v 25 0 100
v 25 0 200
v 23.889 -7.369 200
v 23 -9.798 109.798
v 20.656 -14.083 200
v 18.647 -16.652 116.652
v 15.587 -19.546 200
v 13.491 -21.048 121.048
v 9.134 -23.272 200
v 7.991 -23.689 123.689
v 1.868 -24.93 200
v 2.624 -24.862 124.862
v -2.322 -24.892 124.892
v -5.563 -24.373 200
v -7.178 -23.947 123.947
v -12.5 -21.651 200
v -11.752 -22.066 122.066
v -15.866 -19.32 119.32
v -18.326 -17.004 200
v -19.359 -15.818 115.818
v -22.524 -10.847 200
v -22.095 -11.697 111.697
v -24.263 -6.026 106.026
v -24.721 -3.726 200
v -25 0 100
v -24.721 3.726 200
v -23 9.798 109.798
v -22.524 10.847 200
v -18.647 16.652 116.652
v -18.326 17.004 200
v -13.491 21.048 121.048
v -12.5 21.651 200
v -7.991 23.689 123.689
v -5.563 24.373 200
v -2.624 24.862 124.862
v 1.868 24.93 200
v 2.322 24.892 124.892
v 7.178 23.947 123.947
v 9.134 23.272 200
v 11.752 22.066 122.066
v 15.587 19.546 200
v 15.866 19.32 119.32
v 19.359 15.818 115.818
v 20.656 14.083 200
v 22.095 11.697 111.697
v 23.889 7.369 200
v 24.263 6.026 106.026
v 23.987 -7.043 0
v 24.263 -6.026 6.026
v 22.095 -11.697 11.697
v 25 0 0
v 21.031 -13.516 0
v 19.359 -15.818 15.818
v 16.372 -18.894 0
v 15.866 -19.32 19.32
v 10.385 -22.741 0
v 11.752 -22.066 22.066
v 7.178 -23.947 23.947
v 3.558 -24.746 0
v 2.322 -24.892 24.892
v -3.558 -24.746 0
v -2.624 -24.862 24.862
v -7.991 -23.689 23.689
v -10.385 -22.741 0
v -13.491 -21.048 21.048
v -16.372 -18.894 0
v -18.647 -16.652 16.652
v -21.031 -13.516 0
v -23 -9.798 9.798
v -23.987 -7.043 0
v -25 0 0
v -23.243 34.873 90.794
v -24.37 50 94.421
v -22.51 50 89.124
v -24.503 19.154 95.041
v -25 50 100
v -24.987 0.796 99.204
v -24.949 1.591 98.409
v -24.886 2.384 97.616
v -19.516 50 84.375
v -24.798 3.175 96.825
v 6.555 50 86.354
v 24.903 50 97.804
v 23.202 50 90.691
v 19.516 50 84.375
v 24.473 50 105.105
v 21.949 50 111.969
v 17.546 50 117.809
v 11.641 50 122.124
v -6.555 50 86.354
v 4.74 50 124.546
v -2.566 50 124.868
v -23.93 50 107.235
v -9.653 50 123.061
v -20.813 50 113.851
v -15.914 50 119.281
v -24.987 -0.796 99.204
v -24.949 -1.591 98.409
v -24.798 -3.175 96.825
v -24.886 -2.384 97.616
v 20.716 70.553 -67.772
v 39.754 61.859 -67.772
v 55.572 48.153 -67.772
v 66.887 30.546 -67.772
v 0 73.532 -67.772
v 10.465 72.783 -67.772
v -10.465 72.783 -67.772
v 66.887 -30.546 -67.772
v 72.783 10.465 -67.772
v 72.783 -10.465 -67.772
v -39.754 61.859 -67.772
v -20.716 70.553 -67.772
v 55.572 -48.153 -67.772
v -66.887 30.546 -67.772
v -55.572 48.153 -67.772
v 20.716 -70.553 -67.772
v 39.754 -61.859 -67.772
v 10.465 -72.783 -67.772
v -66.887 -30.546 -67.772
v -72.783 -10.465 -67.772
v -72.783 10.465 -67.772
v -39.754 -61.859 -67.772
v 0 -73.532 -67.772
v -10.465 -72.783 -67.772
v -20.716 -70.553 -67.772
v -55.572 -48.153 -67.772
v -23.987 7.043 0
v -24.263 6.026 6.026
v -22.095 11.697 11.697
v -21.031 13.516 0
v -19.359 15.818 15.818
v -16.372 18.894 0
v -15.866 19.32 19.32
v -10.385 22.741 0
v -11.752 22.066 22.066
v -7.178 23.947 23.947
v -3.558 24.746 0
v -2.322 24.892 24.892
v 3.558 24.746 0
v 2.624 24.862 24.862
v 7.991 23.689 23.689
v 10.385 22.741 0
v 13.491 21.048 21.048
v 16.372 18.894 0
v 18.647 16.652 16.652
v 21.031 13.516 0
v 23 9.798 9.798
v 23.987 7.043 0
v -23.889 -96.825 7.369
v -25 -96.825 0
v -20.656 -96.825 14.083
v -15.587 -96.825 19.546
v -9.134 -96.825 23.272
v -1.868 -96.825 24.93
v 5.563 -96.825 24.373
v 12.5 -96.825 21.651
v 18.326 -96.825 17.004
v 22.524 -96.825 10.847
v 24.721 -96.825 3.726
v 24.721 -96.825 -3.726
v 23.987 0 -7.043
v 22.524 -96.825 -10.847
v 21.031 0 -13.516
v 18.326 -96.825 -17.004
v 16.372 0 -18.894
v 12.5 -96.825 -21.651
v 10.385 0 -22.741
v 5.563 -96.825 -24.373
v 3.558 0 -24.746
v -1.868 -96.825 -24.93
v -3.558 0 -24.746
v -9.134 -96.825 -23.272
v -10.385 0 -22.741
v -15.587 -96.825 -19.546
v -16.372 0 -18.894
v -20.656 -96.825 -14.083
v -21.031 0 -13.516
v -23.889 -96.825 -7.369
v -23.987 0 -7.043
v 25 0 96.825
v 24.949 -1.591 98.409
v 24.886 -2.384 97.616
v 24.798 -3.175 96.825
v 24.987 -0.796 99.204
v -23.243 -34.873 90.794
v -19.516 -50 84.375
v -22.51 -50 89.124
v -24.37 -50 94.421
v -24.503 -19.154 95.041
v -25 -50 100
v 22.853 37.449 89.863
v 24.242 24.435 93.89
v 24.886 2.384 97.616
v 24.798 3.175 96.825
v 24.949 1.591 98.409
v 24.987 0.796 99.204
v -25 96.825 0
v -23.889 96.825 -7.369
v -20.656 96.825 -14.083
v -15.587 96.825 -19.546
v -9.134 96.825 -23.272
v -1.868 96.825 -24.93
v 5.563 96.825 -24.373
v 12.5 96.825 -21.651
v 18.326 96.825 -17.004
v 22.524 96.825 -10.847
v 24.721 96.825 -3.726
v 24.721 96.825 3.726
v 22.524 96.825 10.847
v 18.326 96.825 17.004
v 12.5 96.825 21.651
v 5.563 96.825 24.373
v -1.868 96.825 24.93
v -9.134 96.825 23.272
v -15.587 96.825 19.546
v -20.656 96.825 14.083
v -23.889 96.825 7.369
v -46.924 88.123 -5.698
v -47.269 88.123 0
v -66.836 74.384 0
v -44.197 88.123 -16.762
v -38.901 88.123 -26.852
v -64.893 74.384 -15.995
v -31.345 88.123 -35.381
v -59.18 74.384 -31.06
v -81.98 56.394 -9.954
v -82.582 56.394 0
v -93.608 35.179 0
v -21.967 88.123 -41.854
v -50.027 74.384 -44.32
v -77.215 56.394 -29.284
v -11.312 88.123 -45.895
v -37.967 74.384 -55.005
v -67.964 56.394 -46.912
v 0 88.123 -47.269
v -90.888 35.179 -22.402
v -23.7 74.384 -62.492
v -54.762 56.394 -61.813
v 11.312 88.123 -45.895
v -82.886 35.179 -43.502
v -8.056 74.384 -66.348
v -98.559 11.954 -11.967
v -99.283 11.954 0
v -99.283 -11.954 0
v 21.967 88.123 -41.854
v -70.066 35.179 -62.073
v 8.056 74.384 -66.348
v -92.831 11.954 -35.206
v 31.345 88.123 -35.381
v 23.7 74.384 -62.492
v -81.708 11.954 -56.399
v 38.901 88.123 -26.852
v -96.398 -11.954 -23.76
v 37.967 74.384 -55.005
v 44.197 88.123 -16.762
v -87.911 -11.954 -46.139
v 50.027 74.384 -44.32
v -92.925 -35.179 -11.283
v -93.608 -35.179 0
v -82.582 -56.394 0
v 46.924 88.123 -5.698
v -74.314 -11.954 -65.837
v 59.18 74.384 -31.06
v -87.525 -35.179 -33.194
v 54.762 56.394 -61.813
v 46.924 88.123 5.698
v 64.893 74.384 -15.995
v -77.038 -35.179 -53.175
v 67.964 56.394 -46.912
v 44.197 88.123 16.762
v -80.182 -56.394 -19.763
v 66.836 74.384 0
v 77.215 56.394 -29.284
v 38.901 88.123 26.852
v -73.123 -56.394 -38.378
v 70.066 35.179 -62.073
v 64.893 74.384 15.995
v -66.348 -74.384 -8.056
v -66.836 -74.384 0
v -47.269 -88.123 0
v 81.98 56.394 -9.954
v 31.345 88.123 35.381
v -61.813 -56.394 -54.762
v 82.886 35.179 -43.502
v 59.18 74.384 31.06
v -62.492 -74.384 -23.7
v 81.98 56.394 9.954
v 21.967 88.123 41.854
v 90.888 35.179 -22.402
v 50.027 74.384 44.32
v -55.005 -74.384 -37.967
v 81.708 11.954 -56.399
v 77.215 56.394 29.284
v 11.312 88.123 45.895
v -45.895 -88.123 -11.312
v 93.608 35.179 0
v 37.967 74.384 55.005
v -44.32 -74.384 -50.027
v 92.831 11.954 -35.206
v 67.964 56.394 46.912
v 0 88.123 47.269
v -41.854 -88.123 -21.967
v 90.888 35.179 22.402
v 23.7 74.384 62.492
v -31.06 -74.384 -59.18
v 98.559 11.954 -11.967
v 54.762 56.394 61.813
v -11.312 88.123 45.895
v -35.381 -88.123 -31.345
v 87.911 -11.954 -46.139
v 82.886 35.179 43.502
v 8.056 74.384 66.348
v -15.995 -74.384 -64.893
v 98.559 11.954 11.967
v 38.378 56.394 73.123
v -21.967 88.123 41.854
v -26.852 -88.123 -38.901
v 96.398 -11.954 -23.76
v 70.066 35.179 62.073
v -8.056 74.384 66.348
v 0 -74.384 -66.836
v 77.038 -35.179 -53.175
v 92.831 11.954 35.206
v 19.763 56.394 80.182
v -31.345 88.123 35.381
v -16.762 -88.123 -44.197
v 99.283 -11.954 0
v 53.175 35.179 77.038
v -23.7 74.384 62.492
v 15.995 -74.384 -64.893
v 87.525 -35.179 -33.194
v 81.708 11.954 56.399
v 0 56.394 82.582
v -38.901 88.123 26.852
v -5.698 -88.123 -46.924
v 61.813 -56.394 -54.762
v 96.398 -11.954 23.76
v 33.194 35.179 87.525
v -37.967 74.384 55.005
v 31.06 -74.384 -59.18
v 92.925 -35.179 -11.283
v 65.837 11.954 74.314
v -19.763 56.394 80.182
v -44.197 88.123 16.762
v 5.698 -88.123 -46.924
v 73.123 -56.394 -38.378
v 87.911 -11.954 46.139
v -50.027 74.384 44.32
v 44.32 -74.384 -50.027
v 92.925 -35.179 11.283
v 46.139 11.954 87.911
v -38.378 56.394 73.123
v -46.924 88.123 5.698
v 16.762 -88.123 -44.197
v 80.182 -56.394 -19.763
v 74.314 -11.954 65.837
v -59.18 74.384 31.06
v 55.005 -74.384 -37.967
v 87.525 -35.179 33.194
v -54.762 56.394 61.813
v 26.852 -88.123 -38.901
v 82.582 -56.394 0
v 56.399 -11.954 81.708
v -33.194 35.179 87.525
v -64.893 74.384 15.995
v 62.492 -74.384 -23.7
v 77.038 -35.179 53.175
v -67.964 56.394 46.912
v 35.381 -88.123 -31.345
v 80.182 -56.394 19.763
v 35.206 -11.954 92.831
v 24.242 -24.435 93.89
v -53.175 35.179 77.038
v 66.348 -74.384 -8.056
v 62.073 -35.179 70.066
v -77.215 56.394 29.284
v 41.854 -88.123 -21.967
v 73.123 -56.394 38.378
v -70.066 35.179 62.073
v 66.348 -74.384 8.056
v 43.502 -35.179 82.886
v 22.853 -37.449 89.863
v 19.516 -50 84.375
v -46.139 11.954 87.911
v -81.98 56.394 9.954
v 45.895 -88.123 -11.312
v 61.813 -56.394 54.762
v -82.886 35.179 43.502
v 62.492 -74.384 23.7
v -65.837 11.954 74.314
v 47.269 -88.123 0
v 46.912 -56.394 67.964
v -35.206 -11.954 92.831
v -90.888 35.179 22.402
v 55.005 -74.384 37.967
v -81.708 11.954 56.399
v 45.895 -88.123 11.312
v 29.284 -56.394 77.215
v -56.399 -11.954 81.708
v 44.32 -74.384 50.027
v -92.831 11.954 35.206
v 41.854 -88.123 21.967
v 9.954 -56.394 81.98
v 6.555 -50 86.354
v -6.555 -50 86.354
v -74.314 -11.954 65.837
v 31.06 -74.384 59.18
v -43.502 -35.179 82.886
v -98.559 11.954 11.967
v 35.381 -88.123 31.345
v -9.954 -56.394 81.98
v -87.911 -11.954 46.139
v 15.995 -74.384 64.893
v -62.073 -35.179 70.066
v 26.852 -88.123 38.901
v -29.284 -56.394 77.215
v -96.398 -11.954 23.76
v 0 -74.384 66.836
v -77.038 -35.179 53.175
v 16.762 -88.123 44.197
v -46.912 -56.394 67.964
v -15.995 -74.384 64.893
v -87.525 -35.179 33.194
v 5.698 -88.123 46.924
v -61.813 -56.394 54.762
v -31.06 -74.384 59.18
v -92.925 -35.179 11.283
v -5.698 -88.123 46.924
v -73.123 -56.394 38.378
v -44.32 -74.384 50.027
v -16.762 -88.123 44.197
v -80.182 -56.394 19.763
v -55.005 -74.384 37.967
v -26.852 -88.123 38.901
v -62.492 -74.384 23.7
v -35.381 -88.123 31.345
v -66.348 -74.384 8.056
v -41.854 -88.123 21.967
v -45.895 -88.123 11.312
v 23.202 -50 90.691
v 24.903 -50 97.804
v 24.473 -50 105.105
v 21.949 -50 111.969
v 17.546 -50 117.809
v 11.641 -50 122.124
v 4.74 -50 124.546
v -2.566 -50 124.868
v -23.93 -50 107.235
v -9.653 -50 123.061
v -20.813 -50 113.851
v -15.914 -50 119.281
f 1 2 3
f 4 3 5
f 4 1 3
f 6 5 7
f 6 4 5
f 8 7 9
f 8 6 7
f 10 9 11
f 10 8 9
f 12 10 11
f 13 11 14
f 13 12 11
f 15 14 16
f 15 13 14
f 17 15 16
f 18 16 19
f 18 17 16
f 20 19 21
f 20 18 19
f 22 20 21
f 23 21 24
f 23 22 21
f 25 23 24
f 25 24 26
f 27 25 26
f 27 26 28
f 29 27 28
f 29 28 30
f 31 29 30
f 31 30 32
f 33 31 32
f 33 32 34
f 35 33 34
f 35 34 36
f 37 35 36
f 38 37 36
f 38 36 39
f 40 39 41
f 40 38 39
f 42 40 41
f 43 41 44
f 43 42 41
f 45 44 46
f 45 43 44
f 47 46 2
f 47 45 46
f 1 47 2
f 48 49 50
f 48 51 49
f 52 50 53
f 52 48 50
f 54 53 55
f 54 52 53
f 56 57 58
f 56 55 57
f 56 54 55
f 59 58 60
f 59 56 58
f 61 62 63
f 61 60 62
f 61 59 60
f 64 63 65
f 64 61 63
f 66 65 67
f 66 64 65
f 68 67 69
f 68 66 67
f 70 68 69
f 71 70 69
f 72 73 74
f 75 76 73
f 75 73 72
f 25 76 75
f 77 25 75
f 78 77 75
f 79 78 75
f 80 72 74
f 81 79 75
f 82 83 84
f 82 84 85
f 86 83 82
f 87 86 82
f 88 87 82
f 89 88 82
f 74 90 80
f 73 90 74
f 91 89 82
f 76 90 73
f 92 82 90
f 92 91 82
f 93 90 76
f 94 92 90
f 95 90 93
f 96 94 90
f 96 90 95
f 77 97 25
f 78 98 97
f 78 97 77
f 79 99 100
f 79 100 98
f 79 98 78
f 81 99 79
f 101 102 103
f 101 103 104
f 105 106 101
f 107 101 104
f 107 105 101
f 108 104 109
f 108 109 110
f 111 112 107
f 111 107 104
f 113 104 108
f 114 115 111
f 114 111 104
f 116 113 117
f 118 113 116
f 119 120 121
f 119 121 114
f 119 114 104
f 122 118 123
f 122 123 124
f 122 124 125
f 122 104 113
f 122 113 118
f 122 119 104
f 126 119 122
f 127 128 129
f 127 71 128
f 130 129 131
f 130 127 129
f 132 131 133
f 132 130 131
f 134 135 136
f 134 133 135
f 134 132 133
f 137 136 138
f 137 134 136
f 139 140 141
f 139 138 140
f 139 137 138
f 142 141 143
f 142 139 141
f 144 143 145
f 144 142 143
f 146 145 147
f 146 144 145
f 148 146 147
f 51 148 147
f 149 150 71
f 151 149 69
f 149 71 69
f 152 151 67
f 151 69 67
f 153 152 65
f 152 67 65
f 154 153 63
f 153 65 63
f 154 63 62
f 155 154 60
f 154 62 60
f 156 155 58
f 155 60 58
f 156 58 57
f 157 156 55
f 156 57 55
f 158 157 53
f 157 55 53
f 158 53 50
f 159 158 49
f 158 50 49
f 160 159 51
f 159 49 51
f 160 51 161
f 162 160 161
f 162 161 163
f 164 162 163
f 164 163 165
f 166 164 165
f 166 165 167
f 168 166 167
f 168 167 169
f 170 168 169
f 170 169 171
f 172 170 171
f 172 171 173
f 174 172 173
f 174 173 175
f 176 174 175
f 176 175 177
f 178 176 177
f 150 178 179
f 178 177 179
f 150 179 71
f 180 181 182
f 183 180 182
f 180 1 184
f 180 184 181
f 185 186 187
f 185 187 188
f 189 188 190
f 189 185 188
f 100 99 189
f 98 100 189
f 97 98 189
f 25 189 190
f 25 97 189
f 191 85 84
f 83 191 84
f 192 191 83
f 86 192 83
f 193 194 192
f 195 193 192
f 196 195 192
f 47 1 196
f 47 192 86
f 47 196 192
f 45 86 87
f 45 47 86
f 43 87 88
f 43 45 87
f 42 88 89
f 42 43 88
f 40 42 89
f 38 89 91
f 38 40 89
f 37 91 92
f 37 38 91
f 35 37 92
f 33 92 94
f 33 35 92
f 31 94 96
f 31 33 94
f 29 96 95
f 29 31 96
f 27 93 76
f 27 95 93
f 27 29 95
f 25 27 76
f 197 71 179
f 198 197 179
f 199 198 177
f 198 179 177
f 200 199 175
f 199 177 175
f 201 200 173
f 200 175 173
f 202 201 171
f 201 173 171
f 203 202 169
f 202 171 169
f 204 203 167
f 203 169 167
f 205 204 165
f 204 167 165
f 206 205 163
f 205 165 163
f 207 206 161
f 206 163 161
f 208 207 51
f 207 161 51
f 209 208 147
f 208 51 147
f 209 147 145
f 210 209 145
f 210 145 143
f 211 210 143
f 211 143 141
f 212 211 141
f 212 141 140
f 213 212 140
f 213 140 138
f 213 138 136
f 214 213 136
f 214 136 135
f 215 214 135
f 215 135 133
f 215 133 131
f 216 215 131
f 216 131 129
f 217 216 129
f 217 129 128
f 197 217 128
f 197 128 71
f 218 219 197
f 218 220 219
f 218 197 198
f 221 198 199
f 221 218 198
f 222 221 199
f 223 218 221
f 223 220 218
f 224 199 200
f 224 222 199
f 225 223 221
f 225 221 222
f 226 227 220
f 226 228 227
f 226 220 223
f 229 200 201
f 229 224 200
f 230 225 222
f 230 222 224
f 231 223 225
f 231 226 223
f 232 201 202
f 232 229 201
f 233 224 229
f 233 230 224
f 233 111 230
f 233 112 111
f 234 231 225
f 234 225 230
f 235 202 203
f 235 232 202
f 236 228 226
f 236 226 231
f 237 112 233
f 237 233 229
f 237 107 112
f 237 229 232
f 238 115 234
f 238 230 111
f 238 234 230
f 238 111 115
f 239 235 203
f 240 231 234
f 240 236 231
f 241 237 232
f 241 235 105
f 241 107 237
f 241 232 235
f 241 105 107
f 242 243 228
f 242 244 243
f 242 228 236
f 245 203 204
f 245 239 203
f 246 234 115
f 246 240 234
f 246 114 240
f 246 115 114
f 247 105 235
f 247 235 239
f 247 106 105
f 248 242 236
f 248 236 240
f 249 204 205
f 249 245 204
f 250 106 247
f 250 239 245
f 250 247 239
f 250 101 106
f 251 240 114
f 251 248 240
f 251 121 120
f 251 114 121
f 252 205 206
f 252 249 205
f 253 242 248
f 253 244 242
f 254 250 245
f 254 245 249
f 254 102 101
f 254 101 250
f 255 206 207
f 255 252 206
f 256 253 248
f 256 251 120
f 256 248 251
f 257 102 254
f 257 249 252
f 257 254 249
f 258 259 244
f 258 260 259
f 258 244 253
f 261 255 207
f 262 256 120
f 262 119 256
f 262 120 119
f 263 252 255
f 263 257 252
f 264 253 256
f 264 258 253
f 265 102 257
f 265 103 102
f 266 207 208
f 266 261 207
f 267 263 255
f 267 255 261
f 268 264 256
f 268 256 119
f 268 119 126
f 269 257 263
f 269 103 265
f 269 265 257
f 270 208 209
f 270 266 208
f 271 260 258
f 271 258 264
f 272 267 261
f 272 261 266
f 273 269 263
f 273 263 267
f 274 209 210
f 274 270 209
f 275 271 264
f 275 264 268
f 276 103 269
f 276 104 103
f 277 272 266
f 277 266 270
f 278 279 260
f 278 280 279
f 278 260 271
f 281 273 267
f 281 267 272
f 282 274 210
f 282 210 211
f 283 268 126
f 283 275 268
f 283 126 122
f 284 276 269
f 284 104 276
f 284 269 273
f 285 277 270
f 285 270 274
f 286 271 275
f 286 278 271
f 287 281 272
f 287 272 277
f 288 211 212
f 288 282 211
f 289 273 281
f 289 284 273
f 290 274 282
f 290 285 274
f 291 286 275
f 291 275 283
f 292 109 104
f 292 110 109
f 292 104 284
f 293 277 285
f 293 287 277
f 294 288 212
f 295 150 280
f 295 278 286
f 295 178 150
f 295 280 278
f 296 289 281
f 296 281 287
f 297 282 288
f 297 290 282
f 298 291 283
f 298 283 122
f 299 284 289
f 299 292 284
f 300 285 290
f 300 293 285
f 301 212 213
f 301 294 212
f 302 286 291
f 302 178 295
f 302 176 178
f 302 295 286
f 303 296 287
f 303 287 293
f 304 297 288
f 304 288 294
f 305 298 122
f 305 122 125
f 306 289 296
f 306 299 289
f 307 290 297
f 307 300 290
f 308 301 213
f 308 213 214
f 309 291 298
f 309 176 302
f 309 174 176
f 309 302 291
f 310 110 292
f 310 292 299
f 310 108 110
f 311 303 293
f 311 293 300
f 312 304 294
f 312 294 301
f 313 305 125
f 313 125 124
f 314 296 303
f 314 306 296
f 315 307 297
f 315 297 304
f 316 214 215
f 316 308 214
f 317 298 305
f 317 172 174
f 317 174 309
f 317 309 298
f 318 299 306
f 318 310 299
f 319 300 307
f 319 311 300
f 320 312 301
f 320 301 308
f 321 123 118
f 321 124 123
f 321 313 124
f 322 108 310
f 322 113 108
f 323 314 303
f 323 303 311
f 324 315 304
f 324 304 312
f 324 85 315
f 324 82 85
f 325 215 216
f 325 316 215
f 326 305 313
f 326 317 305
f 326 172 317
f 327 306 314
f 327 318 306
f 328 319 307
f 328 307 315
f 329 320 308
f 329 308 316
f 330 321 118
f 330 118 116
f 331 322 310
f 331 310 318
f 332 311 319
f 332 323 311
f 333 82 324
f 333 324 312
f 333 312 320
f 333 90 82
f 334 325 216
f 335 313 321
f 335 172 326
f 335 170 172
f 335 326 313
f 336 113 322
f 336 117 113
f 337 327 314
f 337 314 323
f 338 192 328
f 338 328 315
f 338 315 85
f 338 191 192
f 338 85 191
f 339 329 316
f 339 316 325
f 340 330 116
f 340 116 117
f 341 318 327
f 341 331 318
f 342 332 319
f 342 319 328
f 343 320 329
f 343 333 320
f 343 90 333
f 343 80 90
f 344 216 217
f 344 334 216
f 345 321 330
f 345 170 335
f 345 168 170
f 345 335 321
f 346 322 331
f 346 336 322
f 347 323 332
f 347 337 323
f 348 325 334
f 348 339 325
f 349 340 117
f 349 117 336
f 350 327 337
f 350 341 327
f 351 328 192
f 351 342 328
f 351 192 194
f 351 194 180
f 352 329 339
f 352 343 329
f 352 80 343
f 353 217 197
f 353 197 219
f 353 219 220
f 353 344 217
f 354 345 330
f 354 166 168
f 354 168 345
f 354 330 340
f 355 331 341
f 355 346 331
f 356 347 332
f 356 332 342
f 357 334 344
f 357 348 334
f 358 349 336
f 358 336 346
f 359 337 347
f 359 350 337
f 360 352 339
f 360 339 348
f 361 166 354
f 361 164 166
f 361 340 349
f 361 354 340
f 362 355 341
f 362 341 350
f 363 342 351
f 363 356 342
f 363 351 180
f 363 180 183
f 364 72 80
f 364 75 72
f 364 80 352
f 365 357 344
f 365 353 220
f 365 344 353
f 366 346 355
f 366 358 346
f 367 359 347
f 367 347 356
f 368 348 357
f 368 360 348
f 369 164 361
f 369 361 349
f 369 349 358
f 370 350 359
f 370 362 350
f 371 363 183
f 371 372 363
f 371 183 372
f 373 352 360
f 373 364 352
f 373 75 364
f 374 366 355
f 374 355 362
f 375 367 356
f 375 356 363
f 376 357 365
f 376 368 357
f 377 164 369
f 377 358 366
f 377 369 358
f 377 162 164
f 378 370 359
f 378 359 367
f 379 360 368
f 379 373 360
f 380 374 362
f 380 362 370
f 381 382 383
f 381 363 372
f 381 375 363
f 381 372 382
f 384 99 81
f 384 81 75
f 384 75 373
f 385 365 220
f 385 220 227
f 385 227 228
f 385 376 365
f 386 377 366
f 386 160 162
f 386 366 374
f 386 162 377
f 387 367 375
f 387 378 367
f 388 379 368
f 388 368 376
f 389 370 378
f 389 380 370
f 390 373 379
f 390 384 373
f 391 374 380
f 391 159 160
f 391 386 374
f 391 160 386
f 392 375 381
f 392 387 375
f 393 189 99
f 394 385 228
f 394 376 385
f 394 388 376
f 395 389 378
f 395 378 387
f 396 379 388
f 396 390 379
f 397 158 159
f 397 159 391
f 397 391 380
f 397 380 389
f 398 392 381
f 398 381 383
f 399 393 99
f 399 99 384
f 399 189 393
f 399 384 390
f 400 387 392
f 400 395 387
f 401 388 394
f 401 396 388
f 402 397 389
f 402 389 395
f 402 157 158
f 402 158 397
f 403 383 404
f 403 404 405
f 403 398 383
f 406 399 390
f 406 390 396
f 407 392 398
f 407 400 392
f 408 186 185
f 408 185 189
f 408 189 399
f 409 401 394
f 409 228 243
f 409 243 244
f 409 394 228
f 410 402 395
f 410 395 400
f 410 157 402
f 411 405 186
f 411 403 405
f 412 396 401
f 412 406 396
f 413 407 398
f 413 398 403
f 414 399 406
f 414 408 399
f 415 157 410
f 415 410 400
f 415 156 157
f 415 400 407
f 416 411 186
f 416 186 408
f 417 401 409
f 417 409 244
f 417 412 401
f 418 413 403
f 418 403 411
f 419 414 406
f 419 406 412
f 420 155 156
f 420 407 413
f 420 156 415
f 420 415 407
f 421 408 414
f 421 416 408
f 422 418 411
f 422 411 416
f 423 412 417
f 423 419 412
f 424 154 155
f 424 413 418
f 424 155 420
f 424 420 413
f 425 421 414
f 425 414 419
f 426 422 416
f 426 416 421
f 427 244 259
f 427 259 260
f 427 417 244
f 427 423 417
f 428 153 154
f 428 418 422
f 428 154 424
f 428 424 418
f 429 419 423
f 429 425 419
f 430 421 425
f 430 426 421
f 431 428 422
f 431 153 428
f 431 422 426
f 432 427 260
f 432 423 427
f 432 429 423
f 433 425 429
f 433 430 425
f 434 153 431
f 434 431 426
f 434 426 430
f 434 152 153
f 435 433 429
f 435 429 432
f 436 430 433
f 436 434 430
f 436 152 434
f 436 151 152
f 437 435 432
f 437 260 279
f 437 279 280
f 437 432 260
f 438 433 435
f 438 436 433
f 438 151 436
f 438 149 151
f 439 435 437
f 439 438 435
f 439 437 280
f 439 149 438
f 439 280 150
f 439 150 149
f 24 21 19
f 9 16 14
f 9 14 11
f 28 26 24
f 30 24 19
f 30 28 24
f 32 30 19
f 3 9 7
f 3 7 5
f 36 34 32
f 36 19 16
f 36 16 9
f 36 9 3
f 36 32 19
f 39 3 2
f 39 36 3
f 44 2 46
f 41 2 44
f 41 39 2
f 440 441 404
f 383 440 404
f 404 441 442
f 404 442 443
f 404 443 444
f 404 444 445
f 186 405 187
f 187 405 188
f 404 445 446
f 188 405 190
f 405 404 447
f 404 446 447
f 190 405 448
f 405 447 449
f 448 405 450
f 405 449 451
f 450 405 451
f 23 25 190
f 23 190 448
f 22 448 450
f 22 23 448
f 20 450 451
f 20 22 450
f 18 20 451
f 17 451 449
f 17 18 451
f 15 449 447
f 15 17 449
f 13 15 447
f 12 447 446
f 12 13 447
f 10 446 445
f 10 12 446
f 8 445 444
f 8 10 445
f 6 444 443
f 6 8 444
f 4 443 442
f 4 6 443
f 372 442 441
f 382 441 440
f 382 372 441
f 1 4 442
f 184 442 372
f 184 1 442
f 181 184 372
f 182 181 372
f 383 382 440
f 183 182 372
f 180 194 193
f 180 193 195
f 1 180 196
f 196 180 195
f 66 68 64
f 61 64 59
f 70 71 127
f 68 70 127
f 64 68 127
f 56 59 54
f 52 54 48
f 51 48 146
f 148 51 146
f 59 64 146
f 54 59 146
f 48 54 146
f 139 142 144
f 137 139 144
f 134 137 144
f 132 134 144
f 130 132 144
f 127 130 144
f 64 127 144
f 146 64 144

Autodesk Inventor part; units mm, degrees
sketch "スケッチ1" plane through (0, 0, 0) normal (0, 0, 1) x (1, 0, 0)
  arc A0 (0, 100) -> (0, -100) centre (0, 0) ccw
  line L0 (0, 100) -> (0, -100)
  dimension "d0" = 200
revolve "回転1" add sketch "スケッチ1" angle 360 about axis through (0, 100, 0) along (0, -1, 0)
ref_plane "作業平面1" through (0, 0, 300) normal (0, 0, 1) x (1, 0, 0)
ref_plane "作業平面2" through (0, 100, 0) normal (0, 1, 0) x (-1, 0, 0)
ref_plane "作業平面3" through (0, -100, 0) normal (0, 1, 0) x (-1, 0, 0)
ref_plane "作業平面4" through (0, 0, 100) normal (0, 0, 1) x (1, 0, 0)
sketch "スケッチ2" plane through (0, 0, 0) normal (1, 0, 0) x (0, 1, 0)
  line L0 (134.8667, -67.7722) -> (-130.8003, -67.7722)
  line L1 (-130.8003, -67.7722) -> (-130.8003, -136.448)
  line L2 (-130.8003, -136.448) -> (134.8667, -136.448)
  line L3 (134.8667, -136.448) -> (134.8667, -67.7722)
  point P0 (0, 0)
extrude "押し出し1" cut sketch "スケッチ2" along normal mid plane 200
sketch "スケッチ3" plane through (0, 0, 0) normal (0, 1, 0) x (-1, 0, 0)
  circle A0 centre (0, 0) radius 25
  dimension "d8" = 50
extrude "押し出し2" cut sketch "スケッチ3" along normal mid plane 200
sketch "スケッチ4" plane through (0, 0, 0) normal (0, 0, 1) x (1, 0, 0)
  circle A0 centre (0, 0) radius 25
  dimension "d11" = 50
extrude "押し出し3" add sketch "スケッチ4" along normal blind 200
sketch "スケッチ5" plane through (0, 0, 0) normal (0, 1, 0) x (-1, 0, 0)
  circle A0 centre (0, 100) radius 25
  point P0 (0, 0)
  dimension "d14" = 50
  dimension "d15" = 100
extrude "押し出し4" add sketch "スケッチ5" along normal mid plane 100
properties part number "ChestP"
